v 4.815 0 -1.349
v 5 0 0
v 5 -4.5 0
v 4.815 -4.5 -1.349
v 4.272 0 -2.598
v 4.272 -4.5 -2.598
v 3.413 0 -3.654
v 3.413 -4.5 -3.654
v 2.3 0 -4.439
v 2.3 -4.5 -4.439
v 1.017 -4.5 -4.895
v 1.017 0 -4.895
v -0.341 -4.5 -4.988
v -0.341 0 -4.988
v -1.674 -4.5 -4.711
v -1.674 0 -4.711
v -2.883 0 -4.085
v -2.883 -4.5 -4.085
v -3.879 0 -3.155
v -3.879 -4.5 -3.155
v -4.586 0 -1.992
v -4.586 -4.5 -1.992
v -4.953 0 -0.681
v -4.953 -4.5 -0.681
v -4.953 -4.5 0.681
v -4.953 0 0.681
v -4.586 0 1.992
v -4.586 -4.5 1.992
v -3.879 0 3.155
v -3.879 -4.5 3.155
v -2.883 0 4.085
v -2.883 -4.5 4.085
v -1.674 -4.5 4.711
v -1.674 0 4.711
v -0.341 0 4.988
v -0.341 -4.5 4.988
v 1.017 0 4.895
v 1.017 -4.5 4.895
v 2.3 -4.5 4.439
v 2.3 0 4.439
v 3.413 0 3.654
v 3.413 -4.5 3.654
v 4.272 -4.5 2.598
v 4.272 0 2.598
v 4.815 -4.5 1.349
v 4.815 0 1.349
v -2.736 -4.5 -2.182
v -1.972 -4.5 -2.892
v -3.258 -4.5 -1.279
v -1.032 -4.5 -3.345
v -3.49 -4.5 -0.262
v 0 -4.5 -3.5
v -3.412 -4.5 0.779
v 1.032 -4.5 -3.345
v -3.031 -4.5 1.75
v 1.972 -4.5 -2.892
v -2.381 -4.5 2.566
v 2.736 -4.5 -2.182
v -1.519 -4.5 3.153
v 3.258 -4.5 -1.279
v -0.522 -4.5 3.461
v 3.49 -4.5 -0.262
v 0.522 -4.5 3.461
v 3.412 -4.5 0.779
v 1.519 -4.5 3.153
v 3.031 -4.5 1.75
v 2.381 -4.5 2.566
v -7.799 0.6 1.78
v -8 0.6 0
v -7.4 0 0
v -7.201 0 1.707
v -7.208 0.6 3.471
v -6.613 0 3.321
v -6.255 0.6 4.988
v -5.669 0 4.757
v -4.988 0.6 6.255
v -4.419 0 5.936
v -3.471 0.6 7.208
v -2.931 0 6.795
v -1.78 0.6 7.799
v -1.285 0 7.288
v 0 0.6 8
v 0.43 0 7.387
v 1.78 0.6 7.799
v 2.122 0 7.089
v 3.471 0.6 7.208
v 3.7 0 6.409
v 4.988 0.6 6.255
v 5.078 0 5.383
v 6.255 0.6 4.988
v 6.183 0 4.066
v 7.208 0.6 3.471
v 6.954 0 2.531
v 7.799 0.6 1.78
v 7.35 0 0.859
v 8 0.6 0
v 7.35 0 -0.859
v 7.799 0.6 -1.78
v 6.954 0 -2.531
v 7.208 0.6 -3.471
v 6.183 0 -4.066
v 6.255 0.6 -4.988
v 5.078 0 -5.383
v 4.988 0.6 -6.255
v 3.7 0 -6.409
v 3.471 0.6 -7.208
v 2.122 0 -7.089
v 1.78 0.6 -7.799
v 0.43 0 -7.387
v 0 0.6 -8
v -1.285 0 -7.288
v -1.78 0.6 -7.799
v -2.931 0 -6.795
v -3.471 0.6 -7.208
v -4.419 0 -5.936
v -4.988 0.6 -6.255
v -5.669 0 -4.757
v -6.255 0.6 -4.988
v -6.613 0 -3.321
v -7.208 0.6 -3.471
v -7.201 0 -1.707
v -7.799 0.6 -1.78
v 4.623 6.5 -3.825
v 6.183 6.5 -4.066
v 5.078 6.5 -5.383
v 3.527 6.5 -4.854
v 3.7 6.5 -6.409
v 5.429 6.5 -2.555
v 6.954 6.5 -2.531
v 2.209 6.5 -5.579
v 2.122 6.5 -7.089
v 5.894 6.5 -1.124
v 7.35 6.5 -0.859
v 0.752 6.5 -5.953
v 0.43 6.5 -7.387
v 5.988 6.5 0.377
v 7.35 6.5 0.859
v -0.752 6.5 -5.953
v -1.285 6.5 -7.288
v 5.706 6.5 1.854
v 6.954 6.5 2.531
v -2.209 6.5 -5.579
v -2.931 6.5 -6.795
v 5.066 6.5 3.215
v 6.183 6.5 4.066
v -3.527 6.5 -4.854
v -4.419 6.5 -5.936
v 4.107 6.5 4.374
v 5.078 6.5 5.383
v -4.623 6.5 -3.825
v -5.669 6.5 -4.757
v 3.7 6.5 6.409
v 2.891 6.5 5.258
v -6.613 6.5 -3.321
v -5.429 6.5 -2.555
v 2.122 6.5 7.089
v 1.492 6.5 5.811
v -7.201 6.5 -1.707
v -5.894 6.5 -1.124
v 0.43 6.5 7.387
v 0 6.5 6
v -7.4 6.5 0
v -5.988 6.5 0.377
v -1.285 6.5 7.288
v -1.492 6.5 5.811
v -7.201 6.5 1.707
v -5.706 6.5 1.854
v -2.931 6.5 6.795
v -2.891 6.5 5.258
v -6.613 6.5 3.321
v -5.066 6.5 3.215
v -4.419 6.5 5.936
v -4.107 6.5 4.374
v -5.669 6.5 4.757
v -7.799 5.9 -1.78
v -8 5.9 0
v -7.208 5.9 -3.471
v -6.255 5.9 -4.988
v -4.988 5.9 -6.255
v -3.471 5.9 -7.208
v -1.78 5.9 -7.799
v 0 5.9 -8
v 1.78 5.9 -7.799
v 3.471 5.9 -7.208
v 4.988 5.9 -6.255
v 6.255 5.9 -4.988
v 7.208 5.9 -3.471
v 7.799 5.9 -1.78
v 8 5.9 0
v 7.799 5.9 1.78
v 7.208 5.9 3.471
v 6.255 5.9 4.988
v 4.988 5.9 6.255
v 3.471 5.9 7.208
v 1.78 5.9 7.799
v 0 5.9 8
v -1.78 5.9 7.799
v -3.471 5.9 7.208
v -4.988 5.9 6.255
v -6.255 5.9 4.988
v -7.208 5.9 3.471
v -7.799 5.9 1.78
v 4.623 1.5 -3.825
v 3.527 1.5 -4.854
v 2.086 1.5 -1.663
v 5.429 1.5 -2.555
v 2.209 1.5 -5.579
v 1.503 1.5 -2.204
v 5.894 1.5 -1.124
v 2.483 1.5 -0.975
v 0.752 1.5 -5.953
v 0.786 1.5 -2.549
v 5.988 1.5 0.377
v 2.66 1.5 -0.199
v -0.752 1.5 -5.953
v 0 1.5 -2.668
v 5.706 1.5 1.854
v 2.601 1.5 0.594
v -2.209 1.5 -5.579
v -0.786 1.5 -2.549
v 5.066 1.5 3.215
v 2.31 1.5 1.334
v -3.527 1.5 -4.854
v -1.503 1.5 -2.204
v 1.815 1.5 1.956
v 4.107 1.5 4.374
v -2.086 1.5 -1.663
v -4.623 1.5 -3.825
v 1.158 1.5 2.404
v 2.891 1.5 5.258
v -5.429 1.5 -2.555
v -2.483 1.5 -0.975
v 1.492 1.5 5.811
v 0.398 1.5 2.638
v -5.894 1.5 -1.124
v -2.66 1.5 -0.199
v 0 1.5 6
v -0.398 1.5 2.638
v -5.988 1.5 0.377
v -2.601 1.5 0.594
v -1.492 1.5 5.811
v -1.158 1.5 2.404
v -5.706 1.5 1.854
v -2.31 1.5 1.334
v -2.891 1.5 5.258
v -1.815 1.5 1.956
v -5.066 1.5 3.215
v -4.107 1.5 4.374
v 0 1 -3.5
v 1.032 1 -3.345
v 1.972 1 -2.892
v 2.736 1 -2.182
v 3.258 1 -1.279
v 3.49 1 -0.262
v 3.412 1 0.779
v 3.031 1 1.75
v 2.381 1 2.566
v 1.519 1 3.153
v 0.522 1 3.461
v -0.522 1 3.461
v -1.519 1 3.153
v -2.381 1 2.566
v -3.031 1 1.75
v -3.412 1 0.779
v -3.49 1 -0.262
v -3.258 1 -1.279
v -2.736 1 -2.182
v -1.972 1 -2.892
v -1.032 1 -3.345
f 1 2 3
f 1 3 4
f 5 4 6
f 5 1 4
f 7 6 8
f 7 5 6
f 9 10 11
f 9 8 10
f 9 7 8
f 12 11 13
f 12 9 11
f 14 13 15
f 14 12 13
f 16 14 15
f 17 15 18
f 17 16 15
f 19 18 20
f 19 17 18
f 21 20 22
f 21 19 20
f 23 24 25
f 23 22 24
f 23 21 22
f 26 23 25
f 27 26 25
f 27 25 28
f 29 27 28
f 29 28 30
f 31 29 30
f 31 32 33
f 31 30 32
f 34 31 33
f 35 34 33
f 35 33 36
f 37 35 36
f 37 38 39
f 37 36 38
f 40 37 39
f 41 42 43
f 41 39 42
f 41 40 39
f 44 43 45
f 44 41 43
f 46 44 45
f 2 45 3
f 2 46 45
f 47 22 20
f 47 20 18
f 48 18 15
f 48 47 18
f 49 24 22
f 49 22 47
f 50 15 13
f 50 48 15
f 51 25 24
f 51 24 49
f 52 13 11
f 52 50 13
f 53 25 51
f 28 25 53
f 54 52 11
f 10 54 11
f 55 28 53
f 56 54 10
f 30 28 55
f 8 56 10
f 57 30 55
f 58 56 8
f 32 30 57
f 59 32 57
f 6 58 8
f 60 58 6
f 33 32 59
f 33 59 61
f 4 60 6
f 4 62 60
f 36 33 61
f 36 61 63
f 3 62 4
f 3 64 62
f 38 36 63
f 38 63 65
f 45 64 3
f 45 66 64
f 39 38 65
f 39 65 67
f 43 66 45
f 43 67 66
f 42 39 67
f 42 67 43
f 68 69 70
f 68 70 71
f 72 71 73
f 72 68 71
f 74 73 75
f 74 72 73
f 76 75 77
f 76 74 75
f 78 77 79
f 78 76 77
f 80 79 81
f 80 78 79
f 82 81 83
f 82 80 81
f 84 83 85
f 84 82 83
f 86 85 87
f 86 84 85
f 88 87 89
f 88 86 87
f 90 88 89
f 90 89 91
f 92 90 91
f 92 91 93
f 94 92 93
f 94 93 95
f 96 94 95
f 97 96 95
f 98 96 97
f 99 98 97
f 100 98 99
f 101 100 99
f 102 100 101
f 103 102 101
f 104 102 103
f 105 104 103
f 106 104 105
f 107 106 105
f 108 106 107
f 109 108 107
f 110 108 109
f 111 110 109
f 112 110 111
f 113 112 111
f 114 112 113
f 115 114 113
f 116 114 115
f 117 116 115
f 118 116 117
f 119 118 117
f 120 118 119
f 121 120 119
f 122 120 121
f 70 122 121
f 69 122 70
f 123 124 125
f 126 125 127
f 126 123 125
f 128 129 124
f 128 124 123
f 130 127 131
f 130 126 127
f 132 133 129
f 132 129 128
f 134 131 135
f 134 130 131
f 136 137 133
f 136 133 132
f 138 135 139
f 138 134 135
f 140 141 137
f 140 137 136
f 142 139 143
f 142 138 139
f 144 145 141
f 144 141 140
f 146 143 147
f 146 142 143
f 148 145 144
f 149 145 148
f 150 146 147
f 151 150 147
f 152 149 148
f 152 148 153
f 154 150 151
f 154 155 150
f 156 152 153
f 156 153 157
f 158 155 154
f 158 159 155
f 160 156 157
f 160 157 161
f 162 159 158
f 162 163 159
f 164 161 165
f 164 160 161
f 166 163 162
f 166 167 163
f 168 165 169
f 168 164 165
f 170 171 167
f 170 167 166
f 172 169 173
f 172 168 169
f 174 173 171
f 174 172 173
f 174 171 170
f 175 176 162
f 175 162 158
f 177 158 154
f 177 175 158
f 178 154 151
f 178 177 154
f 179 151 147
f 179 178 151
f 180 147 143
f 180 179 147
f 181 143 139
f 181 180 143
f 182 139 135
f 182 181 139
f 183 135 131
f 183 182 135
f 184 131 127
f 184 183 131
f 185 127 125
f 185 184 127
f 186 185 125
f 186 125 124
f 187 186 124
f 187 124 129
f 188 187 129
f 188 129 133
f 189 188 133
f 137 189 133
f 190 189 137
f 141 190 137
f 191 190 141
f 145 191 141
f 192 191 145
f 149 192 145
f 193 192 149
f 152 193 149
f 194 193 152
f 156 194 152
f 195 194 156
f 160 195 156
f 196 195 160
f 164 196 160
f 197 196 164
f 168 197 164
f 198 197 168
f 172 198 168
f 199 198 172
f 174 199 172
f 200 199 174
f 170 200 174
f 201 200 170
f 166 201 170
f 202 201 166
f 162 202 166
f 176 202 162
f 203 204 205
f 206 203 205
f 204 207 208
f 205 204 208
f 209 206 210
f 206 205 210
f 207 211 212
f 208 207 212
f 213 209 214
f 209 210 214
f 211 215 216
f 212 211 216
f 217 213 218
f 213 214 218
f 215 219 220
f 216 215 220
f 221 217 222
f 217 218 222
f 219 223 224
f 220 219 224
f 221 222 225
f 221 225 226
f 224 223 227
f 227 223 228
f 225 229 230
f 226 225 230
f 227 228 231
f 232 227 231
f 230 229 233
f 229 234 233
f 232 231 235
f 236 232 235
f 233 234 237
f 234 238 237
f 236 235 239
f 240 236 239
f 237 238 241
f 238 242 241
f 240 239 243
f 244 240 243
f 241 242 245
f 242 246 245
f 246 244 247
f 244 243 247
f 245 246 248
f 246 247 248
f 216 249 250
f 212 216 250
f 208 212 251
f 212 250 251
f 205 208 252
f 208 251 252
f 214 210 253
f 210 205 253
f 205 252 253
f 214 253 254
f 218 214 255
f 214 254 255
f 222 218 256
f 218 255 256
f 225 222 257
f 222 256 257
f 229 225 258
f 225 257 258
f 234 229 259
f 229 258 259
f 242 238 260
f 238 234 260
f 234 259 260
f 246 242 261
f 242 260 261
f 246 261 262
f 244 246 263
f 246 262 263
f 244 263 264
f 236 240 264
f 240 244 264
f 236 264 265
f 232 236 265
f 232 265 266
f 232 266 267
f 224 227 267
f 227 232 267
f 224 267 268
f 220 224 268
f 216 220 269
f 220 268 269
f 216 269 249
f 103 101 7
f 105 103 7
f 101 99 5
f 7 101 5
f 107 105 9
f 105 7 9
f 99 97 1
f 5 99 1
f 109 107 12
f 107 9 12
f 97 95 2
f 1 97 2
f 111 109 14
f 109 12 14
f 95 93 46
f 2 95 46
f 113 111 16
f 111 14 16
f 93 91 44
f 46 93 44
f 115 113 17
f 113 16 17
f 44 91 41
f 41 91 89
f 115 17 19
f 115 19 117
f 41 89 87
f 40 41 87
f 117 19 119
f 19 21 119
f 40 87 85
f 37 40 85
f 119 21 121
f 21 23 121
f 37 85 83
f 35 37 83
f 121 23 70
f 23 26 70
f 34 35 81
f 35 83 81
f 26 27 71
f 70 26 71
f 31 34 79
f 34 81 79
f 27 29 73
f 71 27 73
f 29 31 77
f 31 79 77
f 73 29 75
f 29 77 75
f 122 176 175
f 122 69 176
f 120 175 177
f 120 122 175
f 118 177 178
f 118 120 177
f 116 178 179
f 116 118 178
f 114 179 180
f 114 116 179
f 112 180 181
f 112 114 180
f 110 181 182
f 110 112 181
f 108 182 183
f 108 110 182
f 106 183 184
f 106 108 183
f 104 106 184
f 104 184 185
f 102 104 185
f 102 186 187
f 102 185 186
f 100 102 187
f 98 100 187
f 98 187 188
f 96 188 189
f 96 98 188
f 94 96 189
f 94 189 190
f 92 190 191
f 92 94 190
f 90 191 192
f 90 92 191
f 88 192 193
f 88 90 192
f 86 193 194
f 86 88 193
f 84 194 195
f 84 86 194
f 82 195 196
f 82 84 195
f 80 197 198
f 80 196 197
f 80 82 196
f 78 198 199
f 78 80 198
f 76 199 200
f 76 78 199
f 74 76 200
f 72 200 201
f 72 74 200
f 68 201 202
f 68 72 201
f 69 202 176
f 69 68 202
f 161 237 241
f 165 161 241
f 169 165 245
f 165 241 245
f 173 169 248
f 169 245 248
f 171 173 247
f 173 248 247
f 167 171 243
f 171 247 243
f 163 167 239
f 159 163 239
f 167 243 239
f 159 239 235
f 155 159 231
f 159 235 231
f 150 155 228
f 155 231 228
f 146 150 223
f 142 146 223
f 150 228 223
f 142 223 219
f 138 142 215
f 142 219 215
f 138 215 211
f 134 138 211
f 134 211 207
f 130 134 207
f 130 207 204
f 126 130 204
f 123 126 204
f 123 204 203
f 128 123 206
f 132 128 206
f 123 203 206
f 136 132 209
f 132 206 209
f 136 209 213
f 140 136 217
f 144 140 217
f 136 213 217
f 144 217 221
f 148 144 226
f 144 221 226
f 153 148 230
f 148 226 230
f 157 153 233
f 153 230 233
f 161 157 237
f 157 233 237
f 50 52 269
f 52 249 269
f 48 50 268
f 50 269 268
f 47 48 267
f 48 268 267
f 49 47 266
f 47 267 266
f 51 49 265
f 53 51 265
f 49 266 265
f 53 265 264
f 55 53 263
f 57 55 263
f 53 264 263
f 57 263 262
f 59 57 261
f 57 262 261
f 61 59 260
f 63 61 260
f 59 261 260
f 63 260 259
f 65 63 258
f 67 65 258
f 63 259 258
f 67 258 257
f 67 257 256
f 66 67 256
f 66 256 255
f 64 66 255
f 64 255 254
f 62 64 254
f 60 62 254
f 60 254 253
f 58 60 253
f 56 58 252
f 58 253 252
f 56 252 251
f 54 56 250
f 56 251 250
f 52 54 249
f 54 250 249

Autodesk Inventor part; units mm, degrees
ref_plane "YZ Plane" through (0, 0, 0) normal (1, 0, 0) x (0, 1, 0)
ref_plane "XZ Plane" through (0, 0, 0) normal (0, 1, 0) x (-1, 0, 0)
ref_plane "XY Plane" through (0, 0, 0) normal (0, 0, 1) x (1, 0, 0)
sketch "Skizze1" plane through (0, 0, 0) normal (0, 1, 0) x (-1, 0, 0)
  circle A0 centre (0, 0) radius 8
  dimension "d0" = 16
extrude "Extrusion1" add sketch "Skizze1" along normal blind 6.5
sketch "Skizze2" plane through (0, 0, 0) normal (0, -1, 0) x (1, 0, 0)
  circle A0 centre (0, 0) radius 5
  dimension "d3" = 10
extrude "Extrusion2" add sketch "Skizze2" along normal blind 4.5
sketch "Skizze3" plane through (0, -4.5, 0) normal (0, -1, 0) x (1, 0, 0)
  circle A0 centre (0, 0) radius 5 projected
hole "Bohrung1" at (0, -4.5, 0) direction (0, 1, 0) diameter 7 depth 5.5 tip angle 118
sketch "Skizze4" plane through (0, 6.5, 0) normal (0, 1, 0) x (1, 0, 0)
  circle A0 centre (0, 0) radius 8 projected
hole "Bohrung2" at (0, 6.5, 0) direction (0, -1, 0) diameter 12 depth 5
chamfer "Fasen1" distance 0.6 angle 45 2 edges at (8, 6.5, 0) (8, 0, 0)
properties part number "8"
